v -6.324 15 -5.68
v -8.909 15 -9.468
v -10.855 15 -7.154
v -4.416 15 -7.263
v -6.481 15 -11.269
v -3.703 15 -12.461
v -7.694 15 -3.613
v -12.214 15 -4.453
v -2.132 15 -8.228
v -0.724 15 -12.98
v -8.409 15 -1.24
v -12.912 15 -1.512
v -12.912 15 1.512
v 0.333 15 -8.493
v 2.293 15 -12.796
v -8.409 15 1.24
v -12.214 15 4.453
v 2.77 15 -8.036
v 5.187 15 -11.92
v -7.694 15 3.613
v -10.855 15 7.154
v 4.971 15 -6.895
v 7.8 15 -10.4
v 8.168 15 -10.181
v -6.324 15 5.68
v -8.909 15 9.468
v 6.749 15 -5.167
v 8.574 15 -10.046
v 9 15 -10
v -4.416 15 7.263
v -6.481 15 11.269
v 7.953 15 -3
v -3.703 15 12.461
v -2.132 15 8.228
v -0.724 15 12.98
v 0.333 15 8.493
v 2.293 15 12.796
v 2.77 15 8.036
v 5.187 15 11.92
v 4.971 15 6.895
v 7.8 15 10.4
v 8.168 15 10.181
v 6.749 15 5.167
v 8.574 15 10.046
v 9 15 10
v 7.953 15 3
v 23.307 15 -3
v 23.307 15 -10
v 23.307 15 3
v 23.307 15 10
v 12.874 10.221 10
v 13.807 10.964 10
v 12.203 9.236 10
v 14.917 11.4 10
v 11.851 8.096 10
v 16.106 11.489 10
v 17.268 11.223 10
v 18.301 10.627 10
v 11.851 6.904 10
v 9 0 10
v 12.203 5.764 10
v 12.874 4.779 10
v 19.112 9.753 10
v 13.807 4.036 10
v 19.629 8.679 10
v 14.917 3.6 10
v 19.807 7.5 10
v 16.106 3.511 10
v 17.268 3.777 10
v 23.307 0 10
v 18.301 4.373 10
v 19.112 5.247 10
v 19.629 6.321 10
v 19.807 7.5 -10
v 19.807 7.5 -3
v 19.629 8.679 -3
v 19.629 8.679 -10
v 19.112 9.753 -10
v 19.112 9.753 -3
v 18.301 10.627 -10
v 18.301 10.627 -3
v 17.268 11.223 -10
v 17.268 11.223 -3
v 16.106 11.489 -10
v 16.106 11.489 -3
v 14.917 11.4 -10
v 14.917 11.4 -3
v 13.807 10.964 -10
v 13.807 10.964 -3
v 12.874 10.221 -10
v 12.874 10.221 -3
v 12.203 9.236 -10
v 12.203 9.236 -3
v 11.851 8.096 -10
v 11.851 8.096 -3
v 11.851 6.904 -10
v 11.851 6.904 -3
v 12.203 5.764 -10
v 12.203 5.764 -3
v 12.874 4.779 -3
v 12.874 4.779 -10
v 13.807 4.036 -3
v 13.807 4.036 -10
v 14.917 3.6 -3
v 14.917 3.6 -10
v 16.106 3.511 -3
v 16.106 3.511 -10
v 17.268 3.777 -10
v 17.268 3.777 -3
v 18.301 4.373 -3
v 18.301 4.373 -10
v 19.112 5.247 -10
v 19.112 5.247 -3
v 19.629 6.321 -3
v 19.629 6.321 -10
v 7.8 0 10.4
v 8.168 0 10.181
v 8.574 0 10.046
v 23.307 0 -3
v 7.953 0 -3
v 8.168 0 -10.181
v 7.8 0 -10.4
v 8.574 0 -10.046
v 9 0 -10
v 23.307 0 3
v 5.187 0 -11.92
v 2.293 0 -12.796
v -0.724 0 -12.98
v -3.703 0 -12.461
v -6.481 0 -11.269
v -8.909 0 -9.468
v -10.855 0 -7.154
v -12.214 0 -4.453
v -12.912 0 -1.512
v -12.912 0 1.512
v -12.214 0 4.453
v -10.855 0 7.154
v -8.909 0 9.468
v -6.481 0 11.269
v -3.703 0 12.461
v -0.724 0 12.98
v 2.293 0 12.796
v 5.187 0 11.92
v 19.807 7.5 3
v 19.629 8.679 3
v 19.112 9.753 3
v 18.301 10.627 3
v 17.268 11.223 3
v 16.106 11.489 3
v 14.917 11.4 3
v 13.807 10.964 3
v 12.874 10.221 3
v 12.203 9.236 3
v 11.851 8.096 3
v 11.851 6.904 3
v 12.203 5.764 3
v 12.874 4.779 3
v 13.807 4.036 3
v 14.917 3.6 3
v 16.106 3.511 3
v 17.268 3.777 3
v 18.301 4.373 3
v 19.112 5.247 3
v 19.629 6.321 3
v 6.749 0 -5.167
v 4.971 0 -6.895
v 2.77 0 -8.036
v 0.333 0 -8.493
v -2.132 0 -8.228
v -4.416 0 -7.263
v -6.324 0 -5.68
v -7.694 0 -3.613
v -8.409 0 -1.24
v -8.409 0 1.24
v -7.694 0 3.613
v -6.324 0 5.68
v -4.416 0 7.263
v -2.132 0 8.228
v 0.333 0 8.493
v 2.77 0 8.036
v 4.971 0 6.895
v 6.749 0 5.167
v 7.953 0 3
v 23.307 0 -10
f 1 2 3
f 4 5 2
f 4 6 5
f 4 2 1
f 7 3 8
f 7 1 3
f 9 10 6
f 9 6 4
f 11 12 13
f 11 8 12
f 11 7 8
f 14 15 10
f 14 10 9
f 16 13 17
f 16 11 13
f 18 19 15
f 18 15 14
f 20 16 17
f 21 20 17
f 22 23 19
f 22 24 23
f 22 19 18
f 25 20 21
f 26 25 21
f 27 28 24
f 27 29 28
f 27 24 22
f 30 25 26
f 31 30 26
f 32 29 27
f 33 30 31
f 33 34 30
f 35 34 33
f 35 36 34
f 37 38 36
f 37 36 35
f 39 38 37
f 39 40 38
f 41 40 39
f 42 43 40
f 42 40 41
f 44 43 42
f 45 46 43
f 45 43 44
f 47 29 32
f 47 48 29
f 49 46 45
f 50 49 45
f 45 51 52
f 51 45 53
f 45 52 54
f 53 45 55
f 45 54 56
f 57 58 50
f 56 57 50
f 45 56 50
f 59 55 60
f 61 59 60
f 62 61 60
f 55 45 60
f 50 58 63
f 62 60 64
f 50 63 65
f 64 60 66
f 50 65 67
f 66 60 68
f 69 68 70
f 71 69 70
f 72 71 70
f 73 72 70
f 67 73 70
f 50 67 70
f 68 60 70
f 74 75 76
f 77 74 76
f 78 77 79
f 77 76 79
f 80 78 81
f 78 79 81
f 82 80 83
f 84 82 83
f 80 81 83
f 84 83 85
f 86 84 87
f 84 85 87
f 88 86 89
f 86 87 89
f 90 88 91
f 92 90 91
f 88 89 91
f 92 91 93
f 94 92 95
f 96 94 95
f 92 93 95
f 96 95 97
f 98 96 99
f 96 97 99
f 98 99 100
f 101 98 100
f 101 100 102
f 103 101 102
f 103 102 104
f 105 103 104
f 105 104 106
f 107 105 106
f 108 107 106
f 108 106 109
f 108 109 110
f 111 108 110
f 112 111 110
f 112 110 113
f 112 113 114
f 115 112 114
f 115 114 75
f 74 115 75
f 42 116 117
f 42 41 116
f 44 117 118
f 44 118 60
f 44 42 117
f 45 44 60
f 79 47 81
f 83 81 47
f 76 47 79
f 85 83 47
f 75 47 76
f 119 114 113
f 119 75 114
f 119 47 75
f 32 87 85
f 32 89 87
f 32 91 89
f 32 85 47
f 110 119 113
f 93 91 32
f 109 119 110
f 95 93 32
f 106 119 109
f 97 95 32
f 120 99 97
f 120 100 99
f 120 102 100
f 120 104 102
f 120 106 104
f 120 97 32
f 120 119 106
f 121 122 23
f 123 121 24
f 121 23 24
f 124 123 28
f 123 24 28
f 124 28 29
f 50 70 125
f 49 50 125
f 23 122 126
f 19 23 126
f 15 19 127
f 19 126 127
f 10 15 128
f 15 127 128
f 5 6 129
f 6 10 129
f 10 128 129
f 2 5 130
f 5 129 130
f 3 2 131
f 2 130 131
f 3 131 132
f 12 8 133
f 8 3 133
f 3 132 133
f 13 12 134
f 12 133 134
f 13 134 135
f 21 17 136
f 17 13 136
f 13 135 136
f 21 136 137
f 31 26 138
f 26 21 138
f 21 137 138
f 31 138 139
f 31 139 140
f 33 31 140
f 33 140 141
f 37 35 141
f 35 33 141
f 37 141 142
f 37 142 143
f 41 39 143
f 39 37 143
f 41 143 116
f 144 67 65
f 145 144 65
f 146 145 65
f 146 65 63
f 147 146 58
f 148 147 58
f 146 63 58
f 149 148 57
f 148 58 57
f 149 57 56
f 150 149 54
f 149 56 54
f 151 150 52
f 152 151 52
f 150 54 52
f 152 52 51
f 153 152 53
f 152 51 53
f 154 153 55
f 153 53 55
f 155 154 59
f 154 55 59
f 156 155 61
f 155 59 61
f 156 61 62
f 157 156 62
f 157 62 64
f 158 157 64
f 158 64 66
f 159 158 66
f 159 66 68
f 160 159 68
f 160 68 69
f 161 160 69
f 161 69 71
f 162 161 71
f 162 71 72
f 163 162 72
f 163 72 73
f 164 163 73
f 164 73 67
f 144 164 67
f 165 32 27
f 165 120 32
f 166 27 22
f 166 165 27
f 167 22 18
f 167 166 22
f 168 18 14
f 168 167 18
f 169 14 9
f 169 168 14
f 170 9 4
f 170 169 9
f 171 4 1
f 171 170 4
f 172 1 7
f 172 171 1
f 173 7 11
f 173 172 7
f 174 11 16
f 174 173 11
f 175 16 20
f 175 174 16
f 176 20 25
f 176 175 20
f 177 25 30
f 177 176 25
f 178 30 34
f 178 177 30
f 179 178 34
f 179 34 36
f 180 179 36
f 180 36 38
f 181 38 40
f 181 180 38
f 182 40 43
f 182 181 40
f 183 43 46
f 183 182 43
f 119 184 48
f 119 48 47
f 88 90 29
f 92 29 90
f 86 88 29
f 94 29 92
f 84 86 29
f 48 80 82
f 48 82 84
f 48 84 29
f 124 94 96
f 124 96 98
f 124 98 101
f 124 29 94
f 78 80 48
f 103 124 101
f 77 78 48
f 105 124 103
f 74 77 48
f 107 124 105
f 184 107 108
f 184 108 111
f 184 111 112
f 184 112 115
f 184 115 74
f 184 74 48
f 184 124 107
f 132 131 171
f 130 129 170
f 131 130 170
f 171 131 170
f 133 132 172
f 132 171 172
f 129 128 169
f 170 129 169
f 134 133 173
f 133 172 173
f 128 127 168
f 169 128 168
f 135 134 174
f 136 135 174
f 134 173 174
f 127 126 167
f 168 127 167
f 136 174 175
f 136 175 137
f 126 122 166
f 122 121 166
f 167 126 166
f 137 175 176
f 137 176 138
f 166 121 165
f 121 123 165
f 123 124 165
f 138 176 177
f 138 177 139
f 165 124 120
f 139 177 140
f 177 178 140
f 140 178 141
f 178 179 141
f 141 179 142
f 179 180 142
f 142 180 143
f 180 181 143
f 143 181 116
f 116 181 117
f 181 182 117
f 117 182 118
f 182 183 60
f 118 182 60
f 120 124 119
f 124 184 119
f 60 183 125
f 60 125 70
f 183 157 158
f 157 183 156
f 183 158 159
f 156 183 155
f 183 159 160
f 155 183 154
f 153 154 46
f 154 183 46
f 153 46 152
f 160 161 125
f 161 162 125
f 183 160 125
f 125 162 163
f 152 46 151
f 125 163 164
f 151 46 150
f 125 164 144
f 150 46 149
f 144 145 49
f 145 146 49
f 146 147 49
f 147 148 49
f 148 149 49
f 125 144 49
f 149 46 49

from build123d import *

# Parameters (mm, degrees)
SCHIZZO3_R           = 13
SCHIZZO3_R_2         = 8.5
ANELLO_DEPTH         = 15
AGGANCIOALTO_DEPTH   = 15
SCHIZZO5_W           = 23.306623863
SCHIZZO5_H           = 6
APERTURAANELLO_DEPTH = 31.61370144
SCHIZZO6_R           = 4
FOROPASSANTE_DEPTH   = 37.016644984
RACCORDOBASSO_R      = 2
RACCORDOALTO_R       = 2


with BuildPart() as part:
    # Schizzo3 → Anello (new body)
    with BuildSketch(Plane(origin=(0, 0, 0), x_dir=(1, 0, 0), z_dir=(0, 1, 0))):
        with Locations(Location((0, 0, 0), (0, 0, 270))):
            Circle(SCHIZZO3_R)
        with Locations(Location((0, 0, 0), (0, 0, 270))):
            Circle(SCHIZZO3_R_2, mode=Mode.SUBTRACT)
    extrude(amount=ANELLO_DEPTH)

    # Schizzo4 → AggancioAlto (add)
    with BuildSketch(Plane(origin=(0, 0, 0), x_dir=(1, 0, 0), z_dir=(0, 1, 0))):
        with BuildLine():
            Line((23.306623863, 3), (12.649110641, 3))
            ThreePointArc((12.649110641, 3), (11.046977059, 6.853050259), (8.306623863, 10))
            Line((8.306623863, 10), (23.306623863, 10))
            Line((23.306623863, 10), (23.306623863, 3))
        make_face()
    aggancioalto = extrude(amount=AGGANCIOALTO_DEPTH)

    # AggancioBasso: AggancioAlto across plane
    add(aggancioalto.mirror(Plane.XY))

    # Schizzo5 → AperturaAnello (cut, through all)
    with BuildSketch(Plane(origin=(0, 15, 0), x_dir=(1, 0, 0), z_dir=(0, 1, 0))):
        with Locations((11.653311932, 0)):
            Rectangle(SCHIZZO5_W, SCHIZZO5_H)
    extrude(amount=-APERTURAANELLO_DEPTH, mode=Mode.SUBTRACT)

    # Schizzo6 → ForoPassante (cut, through all)
    with BuildSketch(Plane.XY.offset(10)):
        with Locations((15.806623863, 7.5)):
            Circle(SCHIZZO6_R)
    extrude(amount=-FOROPASSANTE_DEPTH, mode=Mode.SUBTRACT)

    # RaccordoBasso
    raccordobasso_edges = [part.edges().sort_by_distance(p)[0] for p in [
        (8.306623863, 7.5, 10),
    ]]
    fillet(raccordobasso_edges, radius=RACCORDOBASSO_R)

    # RaccordoAlto
    raccordoalto_edges = [part.edges().sort_by_distance(p)[0] for p in [
        (8.306623863, 7.5, -10),
    ]]
    fillet(raccordoalto_edges, radius=RACCORDOALTO_R)


solid = part.part
